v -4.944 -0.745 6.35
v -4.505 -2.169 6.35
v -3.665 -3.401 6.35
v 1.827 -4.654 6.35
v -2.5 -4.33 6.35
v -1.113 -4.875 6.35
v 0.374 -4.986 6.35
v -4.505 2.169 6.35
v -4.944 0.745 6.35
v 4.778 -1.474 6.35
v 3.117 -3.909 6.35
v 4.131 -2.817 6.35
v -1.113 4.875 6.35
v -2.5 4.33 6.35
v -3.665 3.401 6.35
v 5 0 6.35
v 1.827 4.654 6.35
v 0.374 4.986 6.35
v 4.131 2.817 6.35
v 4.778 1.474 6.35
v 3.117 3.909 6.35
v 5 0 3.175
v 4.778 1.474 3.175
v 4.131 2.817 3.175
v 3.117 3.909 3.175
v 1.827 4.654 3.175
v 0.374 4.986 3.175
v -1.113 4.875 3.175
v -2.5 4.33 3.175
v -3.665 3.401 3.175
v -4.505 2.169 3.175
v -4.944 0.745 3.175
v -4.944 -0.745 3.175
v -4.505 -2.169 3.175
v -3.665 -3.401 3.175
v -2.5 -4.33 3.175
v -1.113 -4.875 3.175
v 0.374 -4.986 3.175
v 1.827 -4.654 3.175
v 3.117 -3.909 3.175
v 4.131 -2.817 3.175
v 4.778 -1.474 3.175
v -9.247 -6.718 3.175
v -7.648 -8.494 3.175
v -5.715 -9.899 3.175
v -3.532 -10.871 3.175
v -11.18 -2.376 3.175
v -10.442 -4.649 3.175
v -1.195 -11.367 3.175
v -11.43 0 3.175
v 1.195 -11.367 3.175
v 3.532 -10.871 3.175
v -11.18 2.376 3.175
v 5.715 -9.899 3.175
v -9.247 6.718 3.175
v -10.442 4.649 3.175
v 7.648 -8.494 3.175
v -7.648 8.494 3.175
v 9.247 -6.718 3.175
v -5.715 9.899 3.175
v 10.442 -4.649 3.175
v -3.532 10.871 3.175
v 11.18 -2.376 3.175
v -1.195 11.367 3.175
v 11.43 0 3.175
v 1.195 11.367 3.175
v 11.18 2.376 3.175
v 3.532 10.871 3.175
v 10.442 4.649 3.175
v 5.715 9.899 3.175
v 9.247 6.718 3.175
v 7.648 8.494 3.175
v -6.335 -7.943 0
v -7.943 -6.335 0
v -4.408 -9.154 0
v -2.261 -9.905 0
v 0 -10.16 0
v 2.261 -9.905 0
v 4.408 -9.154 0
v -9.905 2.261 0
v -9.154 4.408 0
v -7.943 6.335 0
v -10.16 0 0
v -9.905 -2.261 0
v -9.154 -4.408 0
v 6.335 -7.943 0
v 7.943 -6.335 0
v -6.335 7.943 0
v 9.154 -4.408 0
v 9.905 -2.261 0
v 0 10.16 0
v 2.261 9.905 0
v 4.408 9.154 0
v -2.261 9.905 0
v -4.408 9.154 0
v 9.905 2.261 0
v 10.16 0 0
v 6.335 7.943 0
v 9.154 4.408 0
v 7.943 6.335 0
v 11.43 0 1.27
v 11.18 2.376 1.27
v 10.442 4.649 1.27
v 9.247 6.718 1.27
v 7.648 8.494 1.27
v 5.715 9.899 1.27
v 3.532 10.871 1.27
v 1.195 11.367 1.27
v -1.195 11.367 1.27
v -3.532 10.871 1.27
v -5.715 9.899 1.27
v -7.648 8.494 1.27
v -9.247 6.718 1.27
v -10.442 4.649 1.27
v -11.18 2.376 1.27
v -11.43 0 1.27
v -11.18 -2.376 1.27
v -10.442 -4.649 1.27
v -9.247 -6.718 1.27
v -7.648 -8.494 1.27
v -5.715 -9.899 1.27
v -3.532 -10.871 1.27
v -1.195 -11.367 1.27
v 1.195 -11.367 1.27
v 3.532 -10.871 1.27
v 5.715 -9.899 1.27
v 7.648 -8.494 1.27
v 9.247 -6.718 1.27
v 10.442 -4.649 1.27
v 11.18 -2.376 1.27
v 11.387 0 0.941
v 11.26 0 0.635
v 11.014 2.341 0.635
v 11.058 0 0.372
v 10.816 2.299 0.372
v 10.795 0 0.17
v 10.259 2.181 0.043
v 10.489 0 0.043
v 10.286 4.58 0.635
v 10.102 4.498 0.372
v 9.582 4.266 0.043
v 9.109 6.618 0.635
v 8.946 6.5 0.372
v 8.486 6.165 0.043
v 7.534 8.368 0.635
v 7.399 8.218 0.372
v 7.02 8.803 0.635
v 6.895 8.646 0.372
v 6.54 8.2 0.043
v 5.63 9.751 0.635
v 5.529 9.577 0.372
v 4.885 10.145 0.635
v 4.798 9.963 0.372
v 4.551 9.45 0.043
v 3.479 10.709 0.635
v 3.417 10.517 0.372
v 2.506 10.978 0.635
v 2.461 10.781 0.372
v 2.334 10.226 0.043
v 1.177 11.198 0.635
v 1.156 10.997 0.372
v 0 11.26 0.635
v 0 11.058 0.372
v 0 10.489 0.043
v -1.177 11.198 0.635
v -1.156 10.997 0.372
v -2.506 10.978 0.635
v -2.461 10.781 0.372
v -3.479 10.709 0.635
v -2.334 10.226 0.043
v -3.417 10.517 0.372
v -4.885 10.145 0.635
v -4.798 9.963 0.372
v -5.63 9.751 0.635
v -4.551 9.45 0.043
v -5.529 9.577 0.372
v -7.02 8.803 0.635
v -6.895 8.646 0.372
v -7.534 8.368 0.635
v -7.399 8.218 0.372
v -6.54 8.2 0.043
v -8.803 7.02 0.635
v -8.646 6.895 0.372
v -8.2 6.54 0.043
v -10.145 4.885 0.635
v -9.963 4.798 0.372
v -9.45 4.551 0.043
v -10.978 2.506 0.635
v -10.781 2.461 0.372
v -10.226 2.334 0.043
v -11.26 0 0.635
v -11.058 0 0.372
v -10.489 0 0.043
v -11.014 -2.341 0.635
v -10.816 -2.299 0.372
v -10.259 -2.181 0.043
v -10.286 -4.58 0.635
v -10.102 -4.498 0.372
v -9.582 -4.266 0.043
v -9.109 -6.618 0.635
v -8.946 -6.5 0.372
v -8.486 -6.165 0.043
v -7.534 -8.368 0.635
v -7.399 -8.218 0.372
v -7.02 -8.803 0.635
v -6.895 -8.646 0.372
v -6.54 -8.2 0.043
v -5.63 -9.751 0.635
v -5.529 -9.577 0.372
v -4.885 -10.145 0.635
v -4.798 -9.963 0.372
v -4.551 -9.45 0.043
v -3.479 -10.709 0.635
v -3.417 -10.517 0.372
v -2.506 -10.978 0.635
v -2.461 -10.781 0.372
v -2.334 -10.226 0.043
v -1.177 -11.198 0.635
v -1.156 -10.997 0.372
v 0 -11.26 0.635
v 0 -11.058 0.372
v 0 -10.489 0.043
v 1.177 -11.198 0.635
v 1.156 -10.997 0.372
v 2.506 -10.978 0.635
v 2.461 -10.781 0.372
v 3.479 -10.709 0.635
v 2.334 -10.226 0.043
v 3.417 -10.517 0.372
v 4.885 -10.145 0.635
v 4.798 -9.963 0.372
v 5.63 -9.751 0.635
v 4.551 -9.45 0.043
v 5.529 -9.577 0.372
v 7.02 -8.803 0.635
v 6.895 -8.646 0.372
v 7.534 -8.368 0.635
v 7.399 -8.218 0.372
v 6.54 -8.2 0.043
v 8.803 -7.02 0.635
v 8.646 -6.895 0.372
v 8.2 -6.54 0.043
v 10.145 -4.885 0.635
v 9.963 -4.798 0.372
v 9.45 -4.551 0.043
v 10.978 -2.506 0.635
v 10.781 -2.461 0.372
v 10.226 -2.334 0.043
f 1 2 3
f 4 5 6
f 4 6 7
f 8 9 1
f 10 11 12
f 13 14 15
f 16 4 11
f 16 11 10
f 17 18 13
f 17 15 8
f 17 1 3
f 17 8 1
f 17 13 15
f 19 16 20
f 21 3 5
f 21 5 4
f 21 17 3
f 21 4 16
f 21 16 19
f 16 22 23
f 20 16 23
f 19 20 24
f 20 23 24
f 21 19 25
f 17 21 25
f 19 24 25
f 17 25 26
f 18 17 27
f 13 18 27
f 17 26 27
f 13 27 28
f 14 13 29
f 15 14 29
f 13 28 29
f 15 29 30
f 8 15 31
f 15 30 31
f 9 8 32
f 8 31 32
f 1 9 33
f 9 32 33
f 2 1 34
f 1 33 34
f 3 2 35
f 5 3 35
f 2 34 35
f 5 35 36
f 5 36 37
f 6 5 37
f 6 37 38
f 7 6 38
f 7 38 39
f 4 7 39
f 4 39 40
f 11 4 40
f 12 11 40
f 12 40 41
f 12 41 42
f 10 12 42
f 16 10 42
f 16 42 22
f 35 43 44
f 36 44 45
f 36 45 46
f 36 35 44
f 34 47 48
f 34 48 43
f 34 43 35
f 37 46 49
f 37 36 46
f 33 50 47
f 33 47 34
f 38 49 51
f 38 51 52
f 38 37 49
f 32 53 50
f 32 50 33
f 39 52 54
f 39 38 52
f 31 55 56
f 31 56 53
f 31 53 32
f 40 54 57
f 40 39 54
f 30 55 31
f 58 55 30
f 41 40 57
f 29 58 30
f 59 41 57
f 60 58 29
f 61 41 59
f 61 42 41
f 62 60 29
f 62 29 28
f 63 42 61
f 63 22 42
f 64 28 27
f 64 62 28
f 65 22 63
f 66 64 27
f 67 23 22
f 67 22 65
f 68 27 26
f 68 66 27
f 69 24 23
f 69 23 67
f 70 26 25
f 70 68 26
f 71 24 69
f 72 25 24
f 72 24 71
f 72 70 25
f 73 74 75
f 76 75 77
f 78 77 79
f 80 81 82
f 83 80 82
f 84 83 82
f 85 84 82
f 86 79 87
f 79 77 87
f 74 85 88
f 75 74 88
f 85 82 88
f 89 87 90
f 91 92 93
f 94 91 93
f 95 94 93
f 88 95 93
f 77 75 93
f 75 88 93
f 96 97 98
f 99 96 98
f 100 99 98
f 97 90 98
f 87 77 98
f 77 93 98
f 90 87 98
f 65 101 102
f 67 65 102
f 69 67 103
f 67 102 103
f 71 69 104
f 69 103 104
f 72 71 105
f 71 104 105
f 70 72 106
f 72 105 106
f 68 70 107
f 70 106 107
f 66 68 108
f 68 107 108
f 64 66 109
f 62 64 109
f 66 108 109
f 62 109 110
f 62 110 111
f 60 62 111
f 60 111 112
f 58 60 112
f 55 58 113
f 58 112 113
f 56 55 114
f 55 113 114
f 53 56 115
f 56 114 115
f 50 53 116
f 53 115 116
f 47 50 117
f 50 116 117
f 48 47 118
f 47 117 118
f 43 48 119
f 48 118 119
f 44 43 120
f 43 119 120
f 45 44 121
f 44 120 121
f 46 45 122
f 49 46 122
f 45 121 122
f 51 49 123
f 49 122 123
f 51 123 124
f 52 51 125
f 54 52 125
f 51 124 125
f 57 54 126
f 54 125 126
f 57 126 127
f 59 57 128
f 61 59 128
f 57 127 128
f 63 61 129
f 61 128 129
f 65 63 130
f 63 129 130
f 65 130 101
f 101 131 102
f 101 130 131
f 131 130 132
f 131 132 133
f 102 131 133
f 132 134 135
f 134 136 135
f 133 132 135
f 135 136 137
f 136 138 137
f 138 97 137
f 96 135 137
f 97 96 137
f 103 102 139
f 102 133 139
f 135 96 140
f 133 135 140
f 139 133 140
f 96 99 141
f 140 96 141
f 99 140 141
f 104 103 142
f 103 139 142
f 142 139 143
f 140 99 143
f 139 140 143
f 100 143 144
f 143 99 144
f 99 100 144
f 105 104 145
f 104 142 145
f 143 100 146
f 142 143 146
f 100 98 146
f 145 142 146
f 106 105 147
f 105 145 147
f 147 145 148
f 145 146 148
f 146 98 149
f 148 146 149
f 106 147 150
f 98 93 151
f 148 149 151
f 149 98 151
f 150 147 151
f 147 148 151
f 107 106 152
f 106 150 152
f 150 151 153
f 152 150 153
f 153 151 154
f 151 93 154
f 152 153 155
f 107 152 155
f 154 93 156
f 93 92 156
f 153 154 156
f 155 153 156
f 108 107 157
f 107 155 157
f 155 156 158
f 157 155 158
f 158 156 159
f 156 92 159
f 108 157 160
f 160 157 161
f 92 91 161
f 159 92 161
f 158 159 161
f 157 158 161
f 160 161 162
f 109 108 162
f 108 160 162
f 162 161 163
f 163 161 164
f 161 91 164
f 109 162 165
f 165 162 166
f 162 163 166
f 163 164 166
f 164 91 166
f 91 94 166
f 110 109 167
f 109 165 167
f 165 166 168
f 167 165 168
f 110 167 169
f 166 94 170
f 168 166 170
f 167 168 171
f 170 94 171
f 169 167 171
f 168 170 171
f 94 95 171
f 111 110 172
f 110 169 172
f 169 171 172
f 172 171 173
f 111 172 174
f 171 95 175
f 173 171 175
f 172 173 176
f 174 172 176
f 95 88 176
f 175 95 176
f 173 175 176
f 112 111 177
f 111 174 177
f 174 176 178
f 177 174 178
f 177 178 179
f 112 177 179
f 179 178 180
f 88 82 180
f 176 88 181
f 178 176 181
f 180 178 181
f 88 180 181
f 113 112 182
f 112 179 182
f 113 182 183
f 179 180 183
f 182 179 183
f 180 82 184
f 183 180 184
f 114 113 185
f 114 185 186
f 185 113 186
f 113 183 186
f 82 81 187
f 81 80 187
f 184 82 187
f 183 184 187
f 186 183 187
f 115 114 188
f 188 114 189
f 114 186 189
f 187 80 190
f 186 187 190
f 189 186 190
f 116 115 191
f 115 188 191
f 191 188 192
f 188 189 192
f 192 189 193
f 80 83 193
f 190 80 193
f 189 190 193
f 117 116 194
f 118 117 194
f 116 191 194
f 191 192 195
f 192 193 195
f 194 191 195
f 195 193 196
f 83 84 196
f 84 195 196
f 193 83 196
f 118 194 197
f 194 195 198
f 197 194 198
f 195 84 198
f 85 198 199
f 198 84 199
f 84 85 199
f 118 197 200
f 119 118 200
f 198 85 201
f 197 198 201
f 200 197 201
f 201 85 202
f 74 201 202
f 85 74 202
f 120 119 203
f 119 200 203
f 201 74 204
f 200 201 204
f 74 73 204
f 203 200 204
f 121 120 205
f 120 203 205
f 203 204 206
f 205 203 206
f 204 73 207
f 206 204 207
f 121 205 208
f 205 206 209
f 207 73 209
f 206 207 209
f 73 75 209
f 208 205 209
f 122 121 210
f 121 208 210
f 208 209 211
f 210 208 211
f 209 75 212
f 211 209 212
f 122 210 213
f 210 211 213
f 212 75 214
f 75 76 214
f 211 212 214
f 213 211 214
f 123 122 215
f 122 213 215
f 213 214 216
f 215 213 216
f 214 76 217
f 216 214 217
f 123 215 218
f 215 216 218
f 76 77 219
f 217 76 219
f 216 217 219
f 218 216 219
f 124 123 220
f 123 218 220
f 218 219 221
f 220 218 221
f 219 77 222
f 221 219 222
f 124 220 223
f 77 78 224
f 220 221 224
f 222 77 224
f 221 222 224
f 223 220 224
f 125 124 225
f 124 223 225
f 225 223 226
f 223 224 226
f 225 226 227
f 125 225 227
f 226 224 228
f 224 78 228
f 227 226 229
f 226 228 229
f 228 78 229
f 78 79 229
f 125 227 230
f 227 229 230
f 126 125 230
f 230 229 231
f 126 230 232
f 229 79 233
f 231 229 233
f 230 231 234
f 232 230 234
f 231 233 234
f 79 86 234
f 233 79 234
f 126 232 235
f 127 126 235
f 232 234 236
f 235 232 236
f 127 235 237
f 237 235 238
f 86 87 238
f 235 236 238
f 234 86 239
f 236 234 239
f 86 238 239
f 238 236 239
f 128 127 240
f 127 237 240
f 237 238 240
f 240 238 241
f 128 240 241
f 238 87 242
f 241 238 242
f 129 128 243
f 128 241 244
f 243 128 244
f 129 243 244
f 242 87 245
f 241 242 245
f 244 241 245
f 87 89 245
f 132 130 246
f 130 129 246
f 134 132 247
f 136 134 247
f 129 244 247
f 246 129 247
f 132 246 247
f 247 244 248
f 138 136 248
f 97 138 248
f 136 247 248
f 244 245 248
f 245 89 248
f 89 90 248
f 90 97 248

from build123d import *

# Parameters (mm, degrees)
F0_R     = 5
F1_DEPTH = 6.35
F0_R_2   = 11.43
F2_DEPTH = 3.175
F3_R     = 1.27


with BuildPart() as f1:
    # F0 (on Top) → F1 (new body)
    with BuildSketch(Plane.XY):
        Circle(F0_R)
    extrude(amount=F1_DEPTH)

    # F0 (on Top) → F2 (join)
    with BuildSketch(Plane.XY):
        Circle(F0_R_2)
        Circle(F0_R, mode=Mode.SUBTRACT)
    extrude(amount=F2_DEPTH)

    # F3
    f3_edges = [f1.edges().sort_by_distance(p)[0] for p in [
        (-11.43, 0, 0),
    ]]
    fillet(f3_edges, radius=F3_R)


solid = f1.part
